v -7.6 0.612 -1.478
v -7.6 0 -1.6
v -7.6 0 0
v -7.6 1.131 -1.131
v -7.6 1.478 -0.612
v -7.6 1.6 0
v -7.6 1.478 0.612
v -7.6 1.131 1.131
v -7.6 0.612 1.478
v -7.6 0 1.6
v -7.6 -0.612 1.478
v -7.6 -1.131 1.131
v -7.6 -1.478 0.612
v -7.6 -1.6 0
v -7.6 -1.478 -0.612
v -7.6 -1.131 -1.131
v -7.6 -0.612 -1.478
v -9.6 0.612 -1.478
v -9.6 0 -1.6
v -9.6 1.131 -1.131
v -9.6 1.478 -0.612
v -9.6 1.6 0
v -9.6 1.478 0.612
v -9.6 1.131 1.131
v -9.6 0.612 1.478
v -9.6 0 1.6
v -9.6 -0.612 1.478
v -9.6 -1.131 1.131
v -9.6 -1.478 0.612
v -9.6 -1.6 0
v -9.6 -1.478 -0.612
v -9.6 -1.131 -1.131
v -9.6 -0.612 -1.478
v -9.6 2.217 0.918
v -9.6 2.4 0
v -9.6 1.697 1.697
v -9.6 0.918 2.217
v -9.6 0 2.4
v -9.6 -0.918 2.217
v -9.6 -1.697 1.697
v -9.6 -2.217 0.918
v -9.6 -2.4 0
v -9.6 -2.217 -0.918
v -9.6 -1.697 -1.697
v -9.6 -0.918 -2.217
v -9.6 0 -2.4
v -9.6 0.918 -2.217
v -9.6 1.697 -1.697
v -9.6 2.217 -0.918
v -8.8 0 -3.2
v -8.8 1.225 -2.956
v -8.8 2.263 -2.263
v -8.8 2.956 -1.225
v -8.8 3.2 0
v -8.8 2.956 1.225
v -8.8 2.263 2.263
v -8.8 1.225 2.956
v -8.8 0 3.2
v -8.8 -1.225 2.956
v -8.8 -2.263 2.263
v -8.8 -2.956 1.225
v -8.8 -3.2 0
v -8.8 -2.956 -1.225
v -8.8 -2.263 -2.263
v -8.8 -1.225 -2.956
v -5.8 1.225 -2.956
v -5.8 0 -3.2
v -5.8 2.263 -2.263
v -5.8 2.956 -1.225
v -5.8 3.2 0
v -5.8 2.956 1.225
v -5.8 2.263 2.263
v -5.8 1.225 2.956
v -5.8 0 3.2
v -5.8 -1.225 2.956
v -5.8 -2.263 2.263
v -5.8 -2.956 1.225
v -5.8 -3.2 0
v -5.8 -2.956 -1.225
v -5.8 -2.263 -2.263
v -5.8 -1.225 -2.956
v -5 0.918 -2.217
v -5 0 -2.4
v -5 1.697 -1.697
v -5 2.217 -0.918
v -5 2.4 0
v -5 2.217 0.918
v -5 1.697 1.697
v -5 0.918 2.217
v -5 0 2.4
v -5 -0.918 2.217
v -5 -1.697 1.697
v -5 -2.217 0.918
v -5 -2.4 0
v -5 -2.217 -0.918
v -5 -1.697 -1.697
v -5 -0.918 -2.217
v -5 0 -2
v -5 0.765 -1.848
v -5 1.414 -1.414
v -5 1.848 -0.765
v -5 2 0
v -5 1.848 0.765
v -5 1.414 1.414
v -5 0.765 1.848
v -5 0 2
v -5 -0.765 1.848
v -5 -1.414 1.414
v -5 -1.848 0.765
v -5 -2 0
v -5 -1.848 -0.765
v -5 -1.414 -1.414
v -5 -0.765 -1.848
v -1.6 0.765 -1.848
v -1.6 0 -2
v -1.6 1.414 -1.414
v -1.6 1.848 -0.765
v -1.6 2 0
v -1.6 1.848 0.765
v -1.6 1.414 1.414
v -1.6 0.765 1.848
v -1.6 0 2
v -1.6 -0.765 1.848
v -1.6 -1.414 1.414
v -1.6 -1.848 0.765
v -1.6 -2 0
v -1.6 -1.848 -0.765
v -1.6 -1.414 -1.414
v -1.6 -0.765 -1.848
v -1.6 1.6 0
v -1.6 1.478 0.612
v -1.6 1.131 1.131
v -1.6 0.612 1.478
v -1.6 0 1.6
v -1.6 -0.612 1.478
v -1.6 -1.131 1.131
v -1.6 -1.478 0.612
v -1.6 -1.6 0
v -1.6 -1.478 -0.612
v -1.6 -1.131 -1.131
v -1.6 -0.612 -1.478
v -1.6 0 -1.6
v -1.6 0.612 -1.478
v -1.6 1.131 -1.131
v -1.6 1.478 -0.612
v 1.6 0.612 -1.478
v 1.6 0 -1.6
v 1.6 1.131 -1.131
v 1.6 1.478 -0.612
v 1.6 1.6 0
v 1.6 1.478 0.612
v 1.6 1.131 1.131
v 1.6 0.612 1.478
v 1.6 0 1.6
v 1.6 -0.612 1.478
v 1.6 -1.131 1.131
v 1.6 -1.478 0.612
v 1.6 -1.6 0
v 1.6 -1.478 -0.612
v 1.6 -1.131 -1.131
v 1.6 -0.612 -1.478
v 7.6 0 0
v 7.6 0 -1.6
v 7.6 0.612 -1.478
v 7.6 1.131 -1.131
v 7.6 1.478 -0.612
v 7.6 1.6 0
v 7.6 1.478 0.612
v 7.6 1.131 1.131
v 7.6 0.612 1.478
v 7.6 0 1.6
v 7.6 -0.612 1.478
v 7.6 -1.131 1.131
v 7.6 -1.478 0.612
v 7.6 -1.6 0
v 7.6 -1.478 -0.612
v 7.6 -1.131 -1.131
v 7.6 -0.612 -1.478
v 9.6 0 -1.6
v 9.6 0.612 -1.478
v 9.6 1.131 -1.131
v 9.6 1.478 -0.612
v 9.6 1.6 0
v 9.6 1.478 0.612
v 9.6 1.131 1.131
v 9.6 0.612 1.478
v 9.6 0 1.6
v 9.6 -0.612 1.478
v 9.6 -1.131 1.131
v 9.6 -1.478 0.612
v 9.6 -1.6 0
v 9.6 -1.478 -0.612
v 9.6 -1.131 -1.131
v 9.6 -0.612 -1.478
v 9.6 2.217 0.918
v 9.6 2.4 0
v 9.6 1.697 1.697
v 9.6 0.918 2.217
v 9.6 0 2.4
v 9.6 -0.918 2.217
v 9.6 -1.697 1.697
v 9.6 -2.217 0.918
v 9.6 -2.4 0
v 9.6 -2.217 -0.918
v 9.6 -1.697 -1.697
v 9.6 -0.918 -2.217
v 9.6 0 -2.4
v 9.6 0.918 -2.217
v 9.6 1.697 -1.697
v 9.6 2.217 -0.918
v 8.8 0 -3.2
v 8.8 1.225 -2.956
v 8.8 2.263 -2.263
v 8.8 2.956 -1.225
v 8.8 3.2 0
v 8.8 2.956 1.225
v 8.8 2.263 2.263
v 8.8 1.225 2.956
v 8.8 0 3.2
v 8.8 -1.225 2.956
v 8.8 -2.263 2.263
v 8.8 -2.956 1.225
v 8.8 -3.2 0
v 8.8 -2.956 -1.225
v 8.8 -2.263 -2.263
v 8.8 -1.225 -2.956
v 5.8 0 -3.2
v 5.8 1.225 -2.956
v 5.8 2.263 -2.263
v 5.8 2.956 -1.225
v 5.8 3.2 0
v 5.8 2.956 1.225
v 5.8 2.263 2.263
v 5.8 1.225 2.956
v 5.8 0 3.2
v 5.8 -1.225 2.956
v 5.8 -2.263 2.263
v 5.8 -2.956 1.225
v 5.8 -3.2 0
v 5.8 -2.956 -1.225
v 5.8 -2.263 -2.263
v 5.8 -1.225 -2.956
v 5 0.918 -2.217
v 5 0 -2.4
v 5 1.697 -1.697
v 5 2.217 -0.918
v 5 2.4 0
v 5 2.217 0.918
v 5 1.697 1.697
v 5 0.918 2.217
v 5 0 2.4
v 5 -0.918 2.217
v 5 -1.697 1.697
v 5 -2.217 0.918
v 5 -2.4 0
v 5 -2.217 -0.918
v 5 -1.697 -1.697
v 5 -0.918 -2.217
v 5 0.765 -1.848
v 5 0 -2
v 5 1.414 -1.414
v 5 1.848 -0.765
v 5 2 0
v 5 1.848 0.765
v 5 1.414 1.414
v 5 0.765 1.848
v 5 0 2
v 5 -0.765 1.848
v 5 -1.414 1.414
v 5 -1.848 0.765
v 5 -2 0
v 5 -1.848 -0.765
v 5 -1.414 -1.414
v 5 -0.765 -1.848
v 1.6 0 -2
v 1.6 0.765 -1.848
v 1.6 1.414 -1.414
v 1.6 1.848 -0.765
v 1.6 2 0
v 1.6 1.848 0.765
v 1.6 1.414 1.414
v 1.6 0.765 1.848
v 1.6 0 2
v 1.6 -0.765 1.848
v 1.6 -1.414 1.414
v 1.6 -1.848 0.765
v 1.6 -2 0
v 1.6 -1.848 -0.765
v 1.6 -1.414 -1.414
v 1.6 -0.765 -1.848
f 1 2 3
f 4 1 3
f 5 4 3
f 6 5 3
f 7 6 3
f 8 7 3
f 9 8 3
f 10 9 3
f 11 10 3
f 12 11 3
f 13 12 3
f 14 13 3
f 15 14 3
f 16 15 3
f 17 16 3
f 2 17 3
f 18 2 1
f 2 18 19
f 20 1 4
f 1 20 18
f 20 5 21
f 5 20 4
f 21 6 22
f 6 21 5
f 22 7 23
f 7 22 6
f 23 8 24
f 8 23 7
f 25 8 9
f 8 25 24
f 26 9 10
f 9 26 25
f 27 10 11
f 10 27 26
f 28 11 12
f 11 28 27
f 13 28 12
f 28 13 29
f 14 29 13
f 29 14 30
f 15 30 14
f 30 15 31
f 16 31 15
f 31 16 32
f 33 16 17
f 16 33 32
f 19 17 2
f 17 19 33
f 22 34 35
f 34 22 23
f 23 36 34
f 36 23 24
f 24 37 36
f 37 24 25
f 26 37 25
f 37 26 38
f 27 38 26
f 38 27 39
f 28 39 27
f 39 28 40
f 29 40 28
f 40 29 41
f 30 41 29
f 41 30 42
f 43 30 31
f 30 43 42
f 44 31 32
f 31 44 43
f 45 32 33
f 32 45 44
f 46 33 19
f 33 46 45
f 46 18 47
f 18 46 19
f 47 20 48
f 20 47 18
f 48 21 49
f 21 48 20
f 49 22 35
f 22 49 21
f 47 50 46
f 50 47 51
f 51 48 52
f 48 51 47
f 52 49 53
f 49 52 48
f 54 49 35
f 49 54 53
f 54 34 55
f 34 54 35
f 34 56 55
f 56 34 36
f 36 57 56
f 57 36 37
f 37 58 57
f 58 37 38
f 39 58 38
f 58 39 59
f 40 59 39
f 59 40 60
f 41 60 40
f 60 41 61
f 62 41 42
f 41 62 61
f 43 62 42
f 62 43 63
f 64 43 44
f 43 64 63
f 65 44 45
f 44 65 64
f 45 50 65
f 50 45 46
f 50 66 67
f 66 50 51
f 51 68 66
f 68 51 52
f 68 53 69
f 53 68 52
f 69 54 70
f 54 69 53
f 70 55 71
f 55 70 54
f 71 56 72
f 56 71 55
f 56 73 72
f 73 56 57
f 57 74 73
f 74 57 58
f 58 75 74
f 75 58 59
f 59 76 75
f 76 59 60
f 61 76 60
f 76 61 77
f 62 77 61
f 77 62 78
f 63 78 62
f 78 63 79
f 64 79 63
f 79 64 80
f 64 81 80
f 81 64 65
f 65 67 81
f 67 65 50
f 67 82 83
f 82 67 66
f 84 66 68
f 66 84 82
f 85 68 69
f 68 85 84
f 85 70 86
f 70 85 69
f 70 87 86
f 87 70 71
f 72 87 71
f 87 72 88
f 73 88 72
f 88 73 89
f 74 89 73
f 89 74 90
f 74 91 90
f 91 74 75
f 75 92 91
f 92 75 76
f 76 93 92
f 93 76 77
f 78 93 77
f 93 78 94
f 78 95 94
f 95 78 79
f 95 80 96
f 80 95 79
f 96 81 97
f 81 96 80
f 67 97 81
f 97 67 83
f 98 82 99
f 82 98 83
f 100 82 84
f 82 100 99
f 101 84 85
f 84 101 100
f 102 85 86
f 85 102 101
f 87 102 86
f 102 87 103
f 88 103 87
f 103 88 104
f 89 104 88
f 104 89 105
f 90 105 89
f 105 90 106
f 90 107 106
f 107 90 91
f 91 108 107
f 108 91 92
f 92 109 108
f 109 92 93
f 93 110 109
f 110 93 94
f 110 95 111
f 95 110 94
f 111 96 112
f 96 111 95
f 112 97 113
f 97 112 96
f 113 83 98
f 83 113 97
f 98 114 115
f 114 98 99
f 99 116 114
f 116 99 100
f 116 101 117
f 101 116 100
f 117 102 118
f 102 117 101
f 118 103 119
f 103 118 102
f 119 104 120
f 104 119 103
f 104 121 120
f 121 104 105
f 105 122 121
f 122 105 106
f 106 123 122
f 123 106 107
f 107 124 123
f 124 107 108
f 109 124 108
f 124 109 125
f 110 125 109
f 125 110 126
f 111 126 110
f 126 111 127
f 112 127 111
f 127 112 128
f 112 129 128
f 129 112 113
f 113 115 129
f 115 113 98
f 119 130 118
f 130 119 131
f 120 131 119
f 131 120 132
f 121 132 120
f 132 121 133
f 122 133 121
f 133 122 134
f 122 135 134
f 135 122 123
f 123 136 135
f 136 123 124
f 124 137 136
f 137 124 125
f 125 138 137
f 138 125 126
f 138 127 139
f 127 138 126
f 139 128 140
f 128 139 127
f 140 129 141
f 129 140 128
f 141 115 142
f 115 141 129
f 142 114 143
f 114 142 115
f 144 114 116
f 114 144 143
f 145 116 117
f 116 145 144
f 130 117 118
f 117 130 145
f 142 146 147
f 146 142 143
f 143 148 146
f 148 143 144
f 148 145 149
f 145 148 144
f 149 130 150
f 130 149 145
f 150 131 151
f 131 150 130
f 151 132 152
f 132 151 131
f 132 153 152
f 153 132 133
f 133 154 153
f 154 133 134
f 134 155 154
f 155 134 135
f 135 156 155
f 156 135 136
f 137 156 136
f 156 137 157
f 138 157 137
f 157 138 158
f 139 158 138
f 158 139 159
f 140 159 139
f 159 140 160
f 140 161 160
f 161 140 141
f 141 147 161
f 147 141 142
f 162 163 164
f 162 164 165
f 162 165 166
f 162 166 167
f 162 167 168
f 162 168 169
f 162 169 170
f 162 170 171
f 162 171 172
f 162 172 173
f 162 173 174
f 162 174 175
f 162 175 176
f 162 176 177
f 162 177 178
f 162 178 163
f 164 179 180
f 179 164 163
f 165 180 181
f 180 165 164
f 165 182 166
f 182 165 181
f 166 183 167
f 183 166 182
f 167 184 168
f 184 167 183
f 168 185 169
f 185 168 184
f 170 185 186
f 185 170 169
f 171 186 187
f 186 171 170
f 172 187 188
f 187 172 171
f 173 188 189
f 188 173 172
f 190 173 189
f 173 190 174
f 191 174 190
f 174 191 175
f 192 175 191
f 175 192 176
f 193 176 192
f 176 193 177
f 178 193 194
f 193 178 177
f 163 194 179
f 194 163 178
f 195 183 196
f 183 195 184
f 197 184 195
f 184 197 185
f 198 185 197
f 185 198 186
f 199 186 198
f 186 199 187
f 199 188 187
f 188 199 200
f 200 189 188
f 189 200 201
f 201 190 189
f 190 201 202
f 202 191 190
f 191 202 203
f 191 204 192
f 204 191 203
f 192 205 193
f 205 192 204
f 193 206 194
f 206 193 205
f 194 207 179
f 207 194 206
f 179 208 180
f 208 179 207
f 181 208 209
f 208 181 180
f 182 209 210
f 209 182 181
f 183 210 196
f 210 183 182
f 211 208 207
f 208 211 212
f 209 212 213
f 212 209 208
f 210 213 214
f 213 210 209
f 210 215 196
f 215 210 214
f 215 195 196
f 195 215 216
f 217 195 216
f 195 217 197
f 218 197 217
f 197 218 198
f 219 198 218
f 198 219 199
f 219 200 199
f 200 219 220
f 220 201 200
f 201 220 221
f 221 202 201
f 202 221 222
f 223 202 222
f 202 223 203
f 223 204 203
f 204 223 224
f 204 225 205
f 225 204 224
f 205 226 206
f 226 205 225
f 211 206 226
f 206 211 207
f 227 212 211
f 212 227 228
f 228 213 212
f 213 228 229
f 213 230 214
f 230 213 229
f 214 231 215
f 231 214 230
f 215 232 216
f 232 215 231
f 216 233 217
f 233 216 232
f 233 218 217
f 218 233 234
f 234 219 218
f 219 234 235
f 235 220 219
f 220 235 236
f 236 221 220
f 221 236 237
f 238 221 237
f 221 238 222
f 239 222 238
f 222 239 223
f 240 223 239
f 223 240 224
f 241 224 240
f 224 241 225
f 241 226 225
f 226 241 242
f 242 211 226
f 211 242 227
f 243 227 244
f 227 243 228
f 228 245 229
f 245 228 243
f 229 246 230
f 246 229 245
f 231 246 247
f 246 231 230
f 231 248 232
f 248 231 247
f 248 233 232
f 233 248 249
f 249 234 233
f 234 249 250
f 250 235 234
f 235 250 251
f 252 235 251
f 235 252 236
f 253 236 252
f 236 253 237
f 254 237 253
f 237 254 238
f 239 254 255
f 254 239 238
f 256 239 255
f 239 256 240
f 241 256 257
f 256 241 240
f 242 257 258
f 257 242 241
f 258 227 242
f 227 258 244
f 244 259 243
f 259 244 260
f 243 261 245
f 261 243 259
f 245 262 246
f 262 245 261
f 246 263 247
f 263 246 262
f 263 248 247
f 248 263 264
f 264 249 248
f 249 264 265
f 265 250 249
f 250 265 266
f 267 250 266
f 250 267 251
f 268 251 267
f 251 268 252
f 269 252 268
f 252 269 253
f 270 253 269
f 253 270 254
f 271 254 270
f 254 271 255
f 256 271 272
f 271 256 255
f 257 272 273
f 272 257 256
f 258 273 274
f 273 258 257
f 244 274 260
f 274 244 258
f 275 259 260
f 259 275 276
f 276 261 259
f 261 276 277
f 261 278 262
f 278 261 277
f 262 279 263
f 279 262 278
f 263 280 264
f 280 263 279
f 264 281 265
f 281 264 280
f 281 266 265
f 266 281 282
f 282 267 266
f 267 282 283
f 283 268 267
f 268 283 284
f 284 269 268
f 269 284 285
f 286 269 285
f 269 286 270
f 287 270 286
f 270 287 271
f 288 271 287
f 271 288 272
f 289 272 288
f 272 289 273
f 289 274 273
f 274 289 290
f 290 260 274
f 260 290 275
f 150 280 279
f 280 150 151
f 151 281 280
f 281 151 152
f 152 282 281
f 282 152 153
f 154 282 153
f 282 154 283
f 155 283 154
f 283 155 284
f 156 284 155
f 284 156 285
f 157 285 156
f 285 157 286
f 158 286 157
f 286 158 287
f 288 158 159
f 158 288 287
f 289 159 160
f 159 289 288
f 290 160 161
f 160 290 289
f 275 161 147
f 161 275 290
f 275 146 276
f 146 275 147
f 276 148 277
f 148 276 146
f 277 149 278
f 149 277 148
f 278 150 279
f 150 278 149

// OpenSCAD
// file: ../p/4-4ring5.scad
use <../lib.scad>
function ldraw_lib__4_4ring5() = [
// 0 Ring  5 x 1.0
// 0 Name: 4-4ring5.dat
// 0 Author: Mark Kennedy [mkennedy]
// 0 !LDRAW_ORG Primitive UPDATE 2012-01
// 0 !LICENSE Licensed under CC BY 2.0 and CC BY 4.0 : see CAreadme.txt
// 
// 0 BFC CERTIFY CCW
  [0,"BFC","CERTIFY"],
  [0,"BFC","CCW"],
// 
// 0 !HISTORY 2001-10-23 [pneaster] resequenced quads, corrected winding.
// 0 !HISTORY 2001-12-29 [pneaster] Added BFC.
// 0 !HISTORY 2002-04-25 [PTadmin] Official Update 2002-02
// 0 !HISTORY 2007-06-24 [PTadmin] Header formatted for Contributor Agreement
// 0 !HISTORY 2008-07-01 [PTadmin] Official Update 2008-01
// 0 !HISTORY 2012-02-16 [Philo] Changed to CCW
// 0 !HISTORY 2012-03-30 [PTadmin] Official Update 2012-01
// 
// 
// 4 16 6 0 0 5.5433 0 2.2961 4.6195 0 1.9135 5 0 0
  [4,16,6,0,0,5.5433,0,2.2961,4.6195,0,1.9135,5,0,0],
// 4 16 5.5433 0 2.2961 4.2426 0 4.2426 3.5355 0 3.5355 4.6195 0 1.9135
  [4,16,5.5433,0,2.2961,4.2426,0,4.2426,3.5355,0,3.5355,4.6195,0,1.9135],
// 4 16 4.2426 0 4.2426 2.2961 0 5.5433 1.9135 0 4.6195 3.5355 0 3.5355
  [4,16,4.2426,0,4.2426,2.2961,0,5.5433,1.9135,0,4.6195,3.5355,0,3.5355],
// 4 16 2.2961 0 5.5433 0 0 6 0 0 5 1.9135 0 4.6195
  [4,16,2.2961,0,5.5433,0,0,6,0,0,5,1.9135,0,4.6195],
// 4 16 0 0 6 -2.2961 0 5.5433 -1.9135 0 4.6195 0 0 5
  [4,16,0,0,6,-2.2961,0,5.5433,-1.9135,0,4.6195,0,0,5],
// 4 16 -2.2961 0 5.5433 -4.2426 0 4.2426 -3.5355 0 3.5355 -1.9135 0 4.6195
  [4,16,-2.2961,0,5.5433,-4.2426,0,4.2426,-3.5355,0,3.5355,-1.9135,0,4.6195],
// 4 16 -4.2426 0 4.2426 -5.5433 0 2.2961 -4.6195 0 1.9135 -3.5355 0 3.5355
  [4,16,-4.2426,0,4.2426,-5.5433,0,2.2961,-4.6195,0,1.9135,-3.5355,0,3.5355],
// 4 16 -5.5433 0 2.2961 -6 0 0 -5 0 0 -4.6195 0 1.9135
  [4,16,-5.5433,0,2.2961,-6,0,0,-5,0,0,-4.6195,0,1.9135],
// 4 16 -6 0 0 -5.5433 0 -2.2961 -4.6195 0 -1.9135 -5 0 0
  [4,16,-6,0,0,-5.5433,0,-2.2961,-4.6195,0,-1.9135,-5,0,0],
// 4 16 -5.5433 0 -2.2961 -4.2426 0 -4.2426 -3.5355 0 -3.5355 -4.6195 0 -1.9135
  [4,16,-5.5433,0,-2.2961,-4.2426,0,-4.2426,-3.5355,0,-3.5355,-4.6195,0,-1.9135],
// 4 16 -4.2426 0 -4.2426 -2.2961 0 -5.5433 -1.9135 0 -4.6195 -3.5355 0 -3.5355
  [4,16,-4.2426,0,-4.2426,-2.2961,0,-5.5433,-1.9135,0,-4.6195,-3.5355,0,-3.5355],
// 4 16 -2.2961 0 -5.5433 0 0 -6 0 0 -5 -1.9135 0 -4.6195
  [4,16,-2.2961,0,-5.5433,0,0,-6,0,0,-5,-1.9135,0,-4.6195],
// 4 16 0 0 -6 2.2961 0 -5.5433 1.9135 0 -4.6195 0 0 -5
  [4,16,0,0,-6,2.2961,0,-5.5433,1.9135,0,-4.6195,0,0,-5],
// 4 16 2.2961 0 -5.5433 4.2426 0 -4.2426 3.5355 0 -3.5355 1.9135 0 -4.6195
  [4,16,2.2961,0,-5.5433,4.2426,0,-4.2426,3.5355,0,-3.5355,1.9135,0,-4.6195],
// 4 16 4.2426 0 -4.2426 5.5433 0 -2.2961 4.6195 0 -1.9135 3.5355 0 -3.5355
  [4,16,4.2426,0,-4.2426,5.5433,0,-2.2961,4.6195,0,-1.9135,3.5355,0,-3.5355],
// 4 16 5.5433 0 -2.2961 6 0 0 5 0 0 4.6195 0 -1.9135
  [4,16,5.5433,0,-2.2961,6,0,0,5,0,0,4.6195,0,-1.9135],
];
makepoly(ldraw_lib__4_4ring5(), line=0.2);
// file: ../p/4-4ring4.scad
use <../lib.scad>
function ldraw_lib__4_4ring4() = [
// 0 Ring  4 x 1.0
// 0 Name: 4-4ring4.dat
// 0 Author: James Jessiman
// 0 !LDRAW_ORG Primitive UPDATE 2009-01
// 0 !LICENSE Licensed under CC BY 2.0 and CC BY 4.0 : see CAreadme.txt
// 
// 0 BFC CERTIFY CCW
  [0,"BFC","CERTIFY"],
  [0,"BFC","CCW"],
// 
// 0 !HISTORY 1998-12-15 [PTadmin] Official Update 1998-10
// 0 !HISTORY 2002-04-08 [BrickCaster] Modified for BFC compliance
// 0 !HISTORY 2002-04-25 [PTadmin] Official Update 2002-02
// 0 !HISTORY 2007-06-24 [PTadmin] Header formatted for Contributor Agreement
// 0 !HISTORY 2008-07-01 [PTadmin] Official Update 2008-01
// 0 !HISTORY 2008-08-26 [cwdee] Switch polygon winding and rename
// 0 !HISTORY 2009-05-02 [PTadmin] Official Update 2009-01
// 
// 
// 4 16 -1.9135 0 4.6195 -1.5308 0 3.6956 0 0 4 0 0 5
  [4,16,-1.9135,0,4.6195,-1.5308,0,3.6956,0,0,4,0,0,5],
// 4 16 -3.5355 0 3.5355 -2.8284 0 2.8284 -1.5308 0 3.6956 -1.9135 0 4.6195
  [4,16,-3.5355,0,3.5355,-2.8284,0,2.8284,-1.5308,0,3.6956,-1.9135,0,4.6195],
// 4 16 -4.6195 0 1.9135 -3.6956 0 1.5308 -2.8284 0 2.8284 -3.5355 0 3.5355
  [4,16,-4.6195,0,1.9135,-3.6956,0,1.5308,-2.8284,0,2.8284,-3.5355,0,3.5355],
// 4 16 -5 0 0 -4 0 0 -3.6956 0 1.5308 -4.6195 0 1.9135
  [4,16,-5,0,0,-4,0,0,-3.6956,0,1.5308,-4.6195,0,1.9135],
// 4 16 -4.6195 0 -1.9135 -3.6956 0 -1.5308 -4 0 0 -5 0 0
  [4,16,-4.6195,0,-1.9135,-3.6956,0,-1.5308,-4,0,0,-5,0,0],
// 4 16 -3.5355 0 -3.5355 -2.8284 0 -2.8284 -3.6956 0 -1.5308 -4.6195 0 -1.9135
  [4,16,-3.5355,0,-3.5355,-2.8284,0,-2.8284,-3.6956,0,-1.5308,-4.6195,0,-1.9135],
// 4 16 -1.9135 0 -4.6195 -1.5308 0 -3.6956 -2.8284 0 -2.8284 -3.5355 0 -3.5355
  [4,16,-1.9135,0,-4.6195,-1.5308,0,-3.6956,-2.8284,0,-2.8284,-3.5355,0,-3.5355],
// 4 16 0 0 -5 0 0 -4 -1.5308 0 -3.6956 -1.9135 0 -4.6195
  [4,16,0,0,-5,0,0,-4,-1.5308,0,-3.6956,-1.9135,0,-4.6195],
// 4 16 1.9135 0 -4.6195 1.5308 0 -3.6956 0 0 -4 0 0 -5
  [4,16,1.9135,0,-4.6195,1.5308,0,-3.6956,0,0,-4,0,0,-5],
// 4 16 3.5355 0 -3.5355 2.8284 0 -2.8284 1.5308 0 -3.6956 1.9135 0 -4.6195
  [4,16,3.5355,0,-3.5355,2.8284,0,-2.8284,1.5308,0,-3.6956,1.9135,0,-4.6195],
// 4 16 4.6195 0 -1.9135 3.6956 0 -1.5308 2.8284 0 -2.8284 3.5355 0 -3.5355
  [4,16,4.6195,0,-1.9135,3.6956,0,-1.5308,2.8284,0,-2.8284,3.5355,0,-3.5355],
// 4 16 5 0 0 4 0 0 3.6956 0 -1.5308 4.6195 0 -1.9135
  [4,16,5,0,0,4,0,0,3.6956,0,-1.5308,4.6195,0,-1.9135],
// 4 16 4.6195 0 1.9135 3.6956 0 1.5308 4 0 0 5 0 0
  [4,16,4.6195,0,1.9135,3.6956,0,1.5308,4,0,0,5,0,0],
// 4 16 3.5355 0 3.5355 2.8284 0 2.8284 3.6956 0 1.5308 4.6195 0 1.9135
  [4,16,3.5355,0,3.5355,2.8284,0,2.8284,3.6956,0,1.5308,4.6195,0,1.9135],
// 4 16 1.9135 0 4.6195 1.5308 0 3.6956 2.8284 0 2.8284 3.5355 0 3.5355
  [4,16,1.9135,0,4.6195,1.5308,0,3.6956,2.8284,0,2.8284,3.5355,0,3.5355],
// 4 16 0 0 5 0 0 4 1.5308 0 3.6956 1.9135 0 4.6195
  [4,16,0,0,5,0,0,4,1.5308,0,3.6956,1.9135,0,4.6195],
// 0
];
makepoly(ldraw_lib__4_4ring4(), line=0.2);
// file: ../p/4-4ring2.scad
use <../lib.scad>
function ldraw_lib__4_4ring2() = [
// 0 Ring  2 x 1.0
// 0 Name: 4-4ring2.dat
// 0 Author: James Jessiman
// 0 !LDRAW_ORG Primitive UPDATE 2009-01
// 0 !LICENSE Licensed under CC BY 2.0 and CC BY 4.0 : see CAreadme.txt
// 
// 0 BFC CERTIFY CCW
  [0,"BFC","CERTIFY"],
  [0,"BFC","CCW"],
// 
// 0 !HISTORY 1998-12-15 [PTadmin] Official Update 1998-10
// 0 !HISTORY 2002-04-05 [hafhead] Added BFC statement
// 0 !HISTORY 2002-04-25 [PTadmin] Official Update 2002-02
// 0 !HISTORY 2007-06-24 [PTadmin] Header formatted for Contributor Agreement
// 0 !HISTORY 2008-07-01 [PTadmin] Official Update 2008-01
// 0 !HISTORY 2008-08-26 [cwdee] Switch polygon winding and rename
// 0 !HISTORY 2009-05-02 [PTadmin] Official Update 2009-01
// 
// 
// 4 16 -1.1481 0 2.7717 -0.7654 0 1.8478 0 0 2 0 0 3
  [4,16,-1.1481,0,2.7717,-0.7654,0,1.8478,0,0,2,0,0,3],
// 4 16 -2.1213 0 2.1213 -1.4142 0 1.4142 -0.7654 0 1.8478 -1.1481 0 2.7717
  [4,16,-2.1213,0,2.1213,-1.4142,0,1.4142,-0.7654,0,1.8478,-1.1481,0,2.7717],
// 4 16 -2.7717 0 1.1481 -1.8478 0 0.7654 -1.4142 0 1.4142 -2.1213 0 2.1213
  [4,16,-2.7717,0,1.1481,-1.8478,0,0.7654,-1.4142,0,1.4142,-2.1213,0,2.1213],
// 4 16 -3 0 0 -2 0 0 -1.8478 0 0.7654 -2.7717 0 1.1481
  [4,16,-3,0,0,-2,0,0,-1.8478,0,0.7654,-2.7717,0,1.1481],
// 4 16 -2.7717 0 -1.1481 -1.8478 0 -0.7654 -2 0 0 -3 0 0
  [4,16,-2.7717,0,-1.1481,-1.8478,0,-0.7654,-2,0,0,-3,0,0],
// 4 16 -2.1213 0 -2.1213 -1.4142 0 -1.4142 -1.8478 0 -0.7654 -2.7717 0 -1.1481
  [4,16,-2.1213,0,-2.1213,-1.4142,0,-1.4142,-1.8478,0,-0.7654,-2.7717,0,-1.1481],
// 4 16 -1.1481 0 -2.7717 -0.7654 0 -1.8478 -1.4142 0 -1.4142 -2.1213 0 -2.1213
  [4,16,-1.1481,0,-2.7717,-0.7654,0,-1.8478,-1.4142,0,-1.4142,-2.1213,0,-2.1213],
// 4 16 0 0 -3 0 0 -2 -0.7654 0 -1.8478 -1.1481 0 -2.7717
  [4,16,0,0,-3,0,0,-2,-0.7654,0,-1.8478,-1.1481,0,-2.7717],
// 4 16 1.1481 0 -2.7717 0.7654 0 -1.8478 0 0 -2 0 0 -3
  [4,16,1.1481,0,-2.7717,0.7654,0,-1.8478,0,0,-2,0,0,-3],
// 4 16 2.1213 0 -2.1213 1.4142 0 -1.4142 0.7654 0 -1.8478 1.1481 0 -2.7717
  [4,16,2.1213,0,-2.1213,1.4142,0,-1.4142,0.7654,0,-1.8478,1.1481,0,-2.7717],
// 4 16 2.7717 0 -1.1481 1.8478 0 -0.7654 1.4142 0 -1.4142 2.1213 0 -2.1213
  [4,16,2.7717,0,-1.1481,1.8478,0,-0.7654,1.4142,0,-1.4142,2.1213,0,-2.1213],
// 4 16 3 0 0 2 0 0 1.8478 0 -0.7654 2.7717 0 -1.1481
  [4,16,3,0,0,2,0,0,1.8478,0,-0.7654,2.7717,0,-1.1481],
// 4 16 2.7717 0 1.1481 1.8478 0 0.7654 2 0 0 3 0 0
  [4,16,2.7717,0,1.1481,1.8478,0,0.7654,2,0,0,3,0,0],
// 4 16 2.1213 0 2.1213 1.4142 0 1.4142 1.8478 0 0.7654 2.7717 0 1.1481
  [4,16,2.1213,0,2.1213,1.4142,0,1.4142,1.8478,0,0.7654,2.7717,0,1.1481],
// 4 16 1.1481 0 2.7717 0.7654 0 1.8478 1.4142 0 1.4142 2.1213 0 2.1213
  [4,16,1.1481,0,2.7717,0.7654,0,1.8478,1.4142,0,1.4142,2.1213,0,2.1213],
// 4 16 0 0 3 0 0 2 0.7654 0 1.8478 1.1481 0 2.7717
  [4,16,0,0,3,0,0,2,0.7654,0,1.8478,1.1481,0,2.7717],
// 0
];
makepoly(ldraw_lib__4_4ring2(), line=0.2);
// file: ../p/4-4edge.scad
use <../lib.scad>
function ldraw_lib__4_4edge() = [
// 0 Circle 1.0
// 0 Name: 4-4edge.dat
// 0 Author: James Jessiman
// 0 !LDRAW_ORG Primitive UPDATE 2017-01
// 0 !LICENSE Licensed under CC BY 2.0 and CC BY 4.0 : see CAreadme.txt
// 
// 0 BFC CERTIFY CCW
  [0,"BFC","CERTIFY"],
  [0,"BFC","CCW"],
// 
// 0 !HISTORY 1998-12-15 [PTadmin] Official Update 1998-10
// 0 !HISTORY 2005-12-28 [PTadmin] Official Update 2005-01
// 0 !HISTORY 2007-06-24 [PTadmin] Header formatted for Contributor Agreement
// 0 !HISTORY 2008-07-01 [PTadmin] Official Update 2008-01
// 0 !HISTORY 2017-01-15 [Steffen] BFCed
// 0 !HISTORY 2017-12-30 [PTadmin] Official Update 2017-01
// 
// 
// 2 24 1 0 0 0.9239 0 0.3827
  [2,24,1,0,0,0.9239,0,0.3827],
// 2 24 0.9239 0 0.3827 0.7071 0 0.7071
  [2,24,0.9239,0,0.3827,0.7071,0,0.7071],
// 2 24 0.7071 0 0.7071 0.3827 0 0.9239
  [2,24,0.7071,0,0.7071,0.3827,0,0.9239],
// 2 24 0.3827 0 0.9239 0 0 1
  [2,24,0.3827,0,0.9239,0,0,1],
// 2 24 0 0 1 -0.3827 0 0.9239
  [2,24,0,0,1,-0.3827,0,0.9239],
// 2 24 -0.3827 0 0.9239 -0.7071 0 0.7071
  [2,24,-0.3827,0,0.9239,-0.7071,0,0.7071],
// 2 24 -0.7071 0 0.7071 -0.9239 0 0.3827
  [2,24,-0.7071,0,0.7071,-0.9239,0,0.3827],
// 2 24 -0.9239 0 0.3827 -1 0 -0
  [2,24,-0.9239,0,0.3827,-1,0,-0],
// 2 24 -1 0 -0 -0.9239 0 -0.3827
  [2,24,-1,0,-0,-0.9239,0,-0.3827],
// 2 24 -0.9239 0 -0.3827 -0.7071 0 -0.7071
  [2,24,-0.9239,0,-0.3827,-0.7071,0,-0.7071],
// 2 24 -0.7071 0 -0.7071 -0.3827 0 -0.9239
  [2,24,-0.7071,0,-0.7071,-0.3827,0,-0.9239],
// 2 24 -0.3827 0 -0.9239 0 0 -1
  [2,24,-0.3827,0,-0.9239,0,0,-1],
// 2 24 0 0 -1 0.3827 0 -0.9239
  [2,24,0,0,-1,0.3827,0,-0.9239],
// 2 24 0.3827 0 -0.9239 0.7071 0 -0.7071
  [2,24,0.3827,0,-0.9239,0.7071,0,-0.7071],
// 2 24 0.7071 0 -0.7071 0.9239 0 -0.3827
  [2,24,0.7071,0,-0.7071,0.9239,0,-0.3827],
// 2 24 0.9239 0 -0.3827 1 0 0
  [2,24,0.9239,0,-0.3827,1,0,0],
];
makepoly(ldraw_lib__4_4edge(), line=0.2);
// file: ../p/4-4disc.scad
use <../lib.scad>
function ldraw_lib__4_4disc() = [
// 0 Disc 1.0
// 0 Name: 4-4disc.dat
// 0 Author: James Jessiman
// 0 !LDRAW_ORG Primitive UPDATE 2002-02
// 0 !LICENSE Licensed under CC BY 2.0 and CC BY 4.0 : see CAreadme.txt
// 
// 0 BFC CERTIFY CCW
  [0,"BFC","CERTIFY"],
  [0,"BFC","CCW"],
// 
// 0 !HISTORY 1998-12-15 [PTadmin] Official Update 1998-10
// 0 !HISTORY 2002-03-23 [sbliss] Added BFC statement
// 0 !HISTORY 2002-04-25 [PTadmin] Official Update 2002-02
// 0 !HISTORY 2007-06-24 [PTadmin] Header formatted for Contributor Agreement
// 0 !HISTORY 2008-07-01 [PTadmin] Official Update 2008-01
// 
// 
// 3 16 0 0 0 1 0 0 0.9239 0 0.3827
  [3,16,0,0,0,1,0,0,0.9239,0,0.3827],
// 3 16 0 0 0 0.9239 0 0.3827 0.7071 0 0.7071
  [3,16,0,0,0,0.9239,0,0.3827,0.7071,0,0.7071],
// 3 16 0 0 0 0.7071 0 0.7071 0.3827 0 0.9239
  [3,16,0,0,0,0.7071,0,0.7071,0.3827,0,0.9239],
// 3 16 0 0 0 0.3827 0 0.9239 0 0 1
  [3,16,0,0,0,0.3827,0,0.9239,0,0,1],
// 3 16 0 0 0 0 0 1 -0.3827 0 0.9239
  [3,16,0,0,0,0,0,1,-0.3827,0,0.9239],
// 3 16 0 0 0 -0.3827 0 0.9239 -0.7071 0 0.7071
  [3,16,0,0,0,-0.3827,0,0.9239,-0.7071,0,0.7071],
// 3 16 0 0 0 -0.7071 0 0.7071 -0.9239 0 0.3827
  [3,16,0,0,0,-0.7071,0,0.7071,-0.9239,0,0.3827],
// 3 16 0 0 0 -0.9239 0 0.3827 -1 0 -0
  [3,16,0,0,0,-0.9239,0,0.3827,-1,0,-0],
// 3 16 0 0 0 -1 0 -0 -0.9239 0 -0.3827
  [3,16,0,0,0,-1,0,-0,-0.9239,0,-0.3827],
// 3 16 0 0 0 -0.9239 0 -0.3827 -0.7071 0 -0.7071
  [3,16,0,0,0,-0.9239,0,-0.3827,-0.7071,0,-0.7071],
// 3 16 0 0 0 -0.7071 0 -0.7071 -0.3827 0 -0.9239
  [3,16,0,0,0,-0.7071,0,-0.7071,-0.3827,0,-0.9239],
// 3 16 0 0 0 -0.3827 0 -0.9239 0 0 -1
  [3,16,0,0,0,-0.3827,0,-0.9239,0,0,-1],
// 3 16 0 0 0 0 0 -1 0.3827 0 -0.9239
  [3,16,0,0,0,0,0,-1,0.3827,0,-0.9239],
// 3 16 0 0 0 0.3827 0 -0.9239 0.7071 0 -0.7071
  [3,16,0,0,0,0.3827,0,-0.9239,0.7071,0,-0.7071],
// 3 16 0 0 0 0.7071 0 -0.7071 0.9239 0 -0.3827
  [3,16,0,0,0,0.7071,0,-0.7071,0.9239,0,-0.3827],
// 3 16 0 0 0 0.9239 0 -0.3827 1 0 0
  [3,16,0,0,0,0.9239,0,-0.3827,1,0,0],
// 0
];
makepoly(ldraw_lib__4_4disc(), line=0.2);
// file: ../p/4-4cyli.scad
use <../lib.scad>
function ldraw_lib__4_4cyli() = [
// 0 Cylinder 1.0
// 0 Name: 4-4cyli.dat
// 0 Author: James Jessiman
// 0 !LDRAW_ORG Primitive UPDATE 2005-01
// 0 !LICENSE Licensed under CC BY 2.0 and CC BY 4.0 : see CAreadme.txt
// 
// 0 BFC CERTIFY CCW
  [0,"BFC","CERTIFY"],
  [0,"BFC","CCW"],
// 
// 0 !HISTORY 1998-12-15 [PTadmin] Official Update 1998-10
// 0 !HISTORY 2002-03-23 [sbliss] Added BFC statement; merged headers from files in distributions LDraw 0.27 and Complete.
// 0 !HISTORY 2002-04-25 [PTadmin] Official Update 2002-02
// 0 !HISTORY 2004-12-14 [guyvivan] BFC CCW
// 0 !HISTORY 2005-12-28 [PTadmin] Official Update 2005-01
// 0 !HISTORY 2007-06-24 [PTadmin] Header formatted for Contributor Agreement
// 0 !HISTORY 2008-07-01 [PTadmin] Official Update 2008-01
// 
// 
// 4 16 1 1 0 0.9239 1 0.3827 0.9239 0 0.3827 1 0 0
  [4,16,1,1,0,0.9239,1,0.3827,0.9239,0,0.3827,1,0,0],
// 5 24 1 0 0 1 1 0 0.9239 0 0.3827 0.9239 0 -0.3827
  [5,24,1,0,0,1,1,0,0.9239,0,0.3827,0.9239,0,-0.3827],
// 4 16 0.9239 1 0.3827 0.7071 1 0.7071 0.7071 0 0.7071 0.9239 0 0.3827
  [4,16,0.9239,1,0.3827,0.7071,1,0.7071,0.7071,0,0.7071,0.9239,0,0.3827],
// 5 24 0.9239 0 0.3827 0.9239 1 0.3827 0.7071 0 0.7071 1 0 0
  [5,24,0.9239,0,0.3827,0.9239,1,0.3827,0.7071,0,0.7071,1,0,0],
// 4 16 0.7071 1 0.7071 0.3827 1 0.9239 0.3827 0 0.9239 0.7071 0 0.7071
  [4,16,0.7071,1,0.7071,0.3827,1,0.9239,0.3827,0,0.9239,0.7071,0,0.7071],
// 5 24 0.7071 0 0.7071 0.7071 1 0.7071 0.3827 0 0.9239 0.9239 0 0.3827
  [5,24,0.7071,0,0.7071,0.7071,1,0.7071,0.3827,0,0.9239,0.9239,0,0.3827],
// 4 16 0.3827 1 0.9239 0 1 1 0 0 1 0.3827 0 0.9239
  [4,16,0.3827,1,0.9239,0,1,1,0,0,1,0.3827,0,0.9239],
// 5 24 0.3827 0 0.9239 0.3827 1 0.9239 0 0 1 0.7071 0 0.7071
  [5,24,0.3827,0,0.9239,0.3827,1,0.9239,0,0,1,0.7071,0,0.7071],
// 4 16 0 1 1 -0.3827 1 0.9239 -0.3827 0 0.9239 0 0 1
  [4,16,0,1,1,-0.3827,1,0.9239,-0.3827,0,0.9239,0,0,1],
// 5 24 0 0 1 0 1 1 -0.3827 0 0.9239 0.3827 0 0.9239
  [5,24,0,0,1,0,1,1,-0.3827,0,0.9239,0.3827,0,0.9239],
// 4 16 -0.3827 1 0.9239 -0.7071 1 0.7071 -0.7071 0 0.7071 -0.3827 0 0.9239
  [4,16,-0.3827,1,0.9239,-0.7071,1,0.7071,-0.7071,0,0.7071,-0.3827,0,0.9239],
// 5 24 -0.3827 0 0.9239 -0.3827 1 0.9239 -0.7071 0 0.7071 0 0 1
  [5,24,-0.3827,0,0.9239,-0.3827,1,0.9239,-0.7071,0,0.7071,0,0,1],
// 4 16 -0.7071 1 0.7071 -0.9239 1 0.3827 -0.9239 0 0.3827 -0.7071 0 0.7071
  [4,16,-0.7071,1,0.7071,-0.9239,1,0.3827,-0.9239,0,0.3827,-0.7071,0,0.7071],
// 5 24 -0.7071 0 0.7071 -0.7071 1 0.7071 -0.9239 0 0.3827 -0.3827 0 0.9239
  [5,24,-0.7071,0,0.7071,-0.7071,1,0.7071,-0.9239,0,0.3827,-0.3827,0,0.9239],
// 4 16 -0.9239 1 0.3827 -1 1 0 -1 0 0 -0.9239 0 0.3827
  [4,16,-0.9239,1,0.3827,-1,1,0,-1,0,0,-0.9239,0,0.3827],
// 5 24 -0.9239 0 0.3827 -0.9239 1 0.3827 -1 0 0 -0.7071 0 0.7071
  [5,24,-0.9239,0,0.3827,-0.9239,1,0.3827,-1,0,0,-0.7071,0,0.7071],
// 4 16 -1 1 0 -0.9239 1 -0.3827 -0.9239 0 -0.3827 -1 0 0
  [4,16,-1,1,0,-0.9239,1,-0.3827,-0.9239,0,-0.3827,-1,0,0],
// 5 24 -1 0 0 -1 1 0 -0.9239 0 -0.3827 -0.9239 0 0.3827
  [5,24,-1,0,0,-1,1,0,-0.9239,0,-0.3827,-0.9239,0,0.3827],
// 4 16 -0.9239 1 -0.3827 -0.7071 1 -0.7071 -0.7071 0 -0.7071 -0.9239 0 -0.3827
  [4,16,-0.9239,1,-0.3827,-0.7071,1,-0.7071,-0.7071,0,-0.7071,-0.9239,0,-0.3827],
// 5 24 -0.9239 0 -0.3827 -0.9239 1 -0.3827 -0.7071 0 -0.7071 -1 0 0
  [5,24,-0.9239,0,-0.3827,-0.9239,1,-0.3827,-0.7071,0,-0.7071,-1,0,0],
// 4 16 -0.7071 1 -0.7071 -0.3827 1 -0.9239 -0.3827 0 -0.9239 -0.7071 0 -0.7071
  [4,16,-0.7071,1,-0.7071,-0.3827,1,-0.9239,-0.3827,0,-0.9239,-0.7071,0,-0.7071],
// 5 24 -0.7071 0 -0.7071 -0.7071 1 -0.7071 -0.3827 0 -0.9239 -0.9239 0 -0.3827
  [5,24,-0.7071,0,-0.7071,-0.7071,1,-0.7071,-0.3827,0,-0.9239,-0.9239,0,-0.3827],
// 4 16 -0.3827 1 -0.9239 0 1 -1 0 0 -1 -0.3827 0 -0.9239
  [4,16,-0.3827,1,-0.9239,0,1,-1,0,0,-1,-0.3827,0,-0.9239],
// 5 24 -0.3827 0 -0.9239 -0.3827 1 -0.9239 0 0 -1 -0.7071 0 -0.7071
  [5,24,-0.3827,0,-0.9239,-0.3827,1,-0.9239,0,0,-1,-0.7071,0,-0.7071],
// 4 16 0 1 -1 0.3827 1 -0.9239 0.3827 0 -0.9239 0 0 -1
  [4,16,0,1,-1,0.3827,1,-0.9239,0.3827,0,-0.9239,0,0,-1],
// 5 24 0 0 -1 0 1 -1 0.3827 0 -0.9239 -0.3827 0 -0.9239
  [5,24,0,0,-1,0,1,-1,0.3827,0,-0.9239,-0.3827,0,-0.9239],
// 4 16 0.3827 1 -0.9239 0.7071 1 -0.7071 0.7071 0 -0.7071 0.3827 0 -0.9239
  [4,16,0.3827,1,-0.9239,0.7071,1,-0.7071,0.7071,0,-0.7071,0.3827,0,-0.9239],
// 5 24 0.3827 0 -0.9239 0.3827 1 -0.9239 0.7071 0 -0.7071 0 0 -1
  [5,24,0.3827,0,-0.9239,0.3827,1,-0.9239,0.7071,0,-0.7071,0,0,-1],
// 4 16 0.7071 1 -0.7071 0.9239 1 -0.3827 0.9239 0 -0.3827 0.7071 0 -0.7071
  [4,16,0.7071,1,-0.7071,0.9239,1,-0.3827,0.9239,0,-0.3827,0.7071,0,-0.7071],
// 5 24 0.7071 0 -0.7071 0.7071 1 -0.7071 0.9239 0 -0.3827 0.3827 0 -0.9239
  [5,24,0.7071,0,-0.7071,0.7071,1,-0.7071,0.9239,0,-0.3827,0.3827,0,-0.9239],
// 4 16 0.9239 1 -0.3827 1 1 0 1 0 0 0.9239 0 -0.3827
  [4,16,0.9239,1,-0.3827,1,1,0,1,0,0,0.9239,0,-0.3827],
// 5 24 0.9239 0 -0.3827 0.9239 1 -0.3827 1 0 0 0.7071 0 -0.7071
  [5,24,0.9239,0,-0.3827,0.9239,1,-0.3827,1,0,0,0.7071,0,-0.7071],
// 0
];
makepoly(ldraw_lib__4_4cyli(), line=0.2);
// file: ../p/4-4con3.scad
use <../lib.scad>
function ldraw_lib__4_4con3() = [
// 0 Cone  3 x 1.0
// 0 Name: 4-4con3.dat
// 0 Author: Niels Karsdorp [nielsk]
// 0 !LDRAW_ORG Primitive UPDATE 2003-02
// 0 !LICENSE Licensed under CC BY 2.0 and CC BY 4.0 : see CAreadme.txt
// 
// 0 BFC CERTIFY CCW
  [0,"BFC","CERTIFY"],
  [0,"BFC","CCW"],
// 
// 0 !HISTORY 2003-08-01 [PTadmin] Official Update 2003-02
// 0 !HISTORY 2007-06-24 [PTadmin] Header formatted for Contributor Agreement
// 0 !HISTORY 2008-07-01 [PTadmin] Official Update 2008-01
// 
// 
// 5 24 3 1 0 4 0 0 2.7717 1 1.1481 2.7717 1 -1.1481
  [5,24,3,1,0,4,0,0,2.7717,1,1.1481,2.7717,1,-1.1481],
// 5 24 2.7717 1 1.1481 3.6956 0 1.5308 2.1213 1 2.1213 3 1 0
  [5,24,2.7717,1,1.1481,3.6956,0,1.5308,2.1213,1,2.1213,3,1,0],
// 5 24 2.1213 1 2.1213 2.8284 0 2.8284 1.1481 1 2.7717 2.7717 1 1.1481
  [5,24,2.1213,1,2.1213,2.8284,0,2.8284,1.1481,1,2.7717,2.7717,1,1.1481],
// 5 24 1.1481 1 2.7717 1.5308 0 3.6956 0 1 3 2.1213 1 2.1213
  [5,24,1.1481,1,2.7717,1.5308,0,3.6956,0,1,3,2.1213,1,2.1213],
// 5 24 0 1 3 0 0 4 -1.1481 1 2.7717 1.1481 1 2.7717
  [5,24,0,1,3,0,0,4,-1.1481,1,2.7717,1.1481,1,2.7717],
// 5 24 -1.1481 1 2.7717 -1.5308 0 3.6956 -2.1213 1 2.1213 0 1 3
  [5,24,-1.1481,1,2.7717,-1.5308,0,3.6956,-2.1213,1,2.1213,0,1,3],
// 5 24 -2.1213 1 2.1213 -2.8284 0 2.8284 -2.7717 1 1.1481 -1.1481 1 2.7717
  [5,24,-2.1213,1,2.1213,-2.8284,0,2.8284,-2.7717,1,1.1481,-1.1481,1,2.7717],
// 5 24 -2.7717 1 1.1481 -3.6956 0 1.5308 -3 1 0 -2.1213 1 2.1213
  [5,24,-2.7717,1,1.1481,-3.6956,0,1.5308,-3,1,0,-2.1213,1,2.1213],
// 5 24 -3 1 0 -4 0 0 -2.7717 1 -1.1481 -2.7717 1 1.1481
  [5,24,-3,1,0,-4,0,0,-2.7717,1,-1.1481,-2.7717,1,1.1481],
// 5 24 -2.7717 1 -1.1481 -3.6956 0 -1.5308 -2.1213 1 -2.1213 -3 1 0
  [5,24,-2.7717,1,-1.1481,-3.6956,0,-1.5308,-2.1213,1,-2.1213,-3,1,0],
// 5 24 -2.1213 1 -2.1213 -2.8284 0 -2.8284 -1.1481 1 -2.7717 -2.7717 1 -1.1481
  [5,24,-2.1213,1,-2.1213,-2.8284,0,-2.8284,-1.1481,1,-2.7717,-2.7717,1,-1.1481],
// 5 24 -1.1481 1 -2.7717 -1.5308 0 -3.6956 0 1 -3 -2.1213 1 -2.1213
  [5,24,-1.1481,1,-2.7717,-1.5308,0,-3.6956,0,1,-3,-2.1213,1,-2.1213],
// 5 24 0 1 -3 0 0 -4 1.1481 1 -2.7717 -1.1481 1 -2.7717
  [5,24,0,1,-3,0,0,-4,1.1481,1,-2.7717,-1.1481,1,-2.7717],
// 5 24 1.1481 1 -2.7717 1.5308 0 -3.6956 2.1213 1 -2.1213 0 1 -3
  [5,24,1.1481,1,-2.7717,1.5308,0,-3.6956,2.1213,1,-2.1213,0,1,-3],
// 5 24 2.1213 1 -2.1213 2.8284 0 -2.8284 2.7717 1 -1.1481 1.1481 1 -2.7717
  [5,24,2.1213,1,-2.1213,2.8284,0,-2.8284,2.7717,1,-1.1481,1.1481,1,-2.7717],
// 5 24 2.7717 1 -1.1481 3.6956 0 -1.5308 3 1 0 2.1213 1 -2.1213
  [5,24,2.7717,1,-1.1481,3.6956,0,-1.5308,3,1,0,2.1213,1,-2.1213],
// 
// 4 16 3 1 0 2.7717 1 1.1481 3.6956 0 1.5308 4 0 0
  [4,16,3,1,0,2.7717,1,1.1481,3.6956,0,1.5308,4,0,0],
// 4 16 2.7717 1 1.1481 2.1213 1 2.1213 2.8284 0 2.8284 3.6956 0 1.5308
  [4,16,2.7717,1,1.1481,2.1213,1,2.1213,2.8284,0,2.8284,3.6956,0,1.5308],
// 4 16 2.1213 1 2.1213 1.1481 1 2.7717 1.5308 0 3.6956 2.8284 0 2.8284
  [4,16,2.1213,1,2.1213,1.1481,1,2.7717,1.5308,0,3.6956,2.8284,0,2.8284],
// 4 16 1.1481 1 2.7717 0 1 3 0 0 4 1.5308 0 3.6956
  [4,16,1.1481,1,2.7717,0,1,3,0,0,4,1.5308,0,3.6956],
// 4 16 0 1 3 -1.1481 1 2.7717 -1.5308 0 3.6956 0 0 4
  [4,16,0,1,3,-1.1481,1,2.7717,-1.5308,0,3.6956,0,0,4],
// 4 16 -1.1481 1 2.7717 -2.1213 1 2.1213 -2.8284 0 2.8284 -1.5308 0 3.6956
  [4,16,-1.1481,1,2.7717,-2.1213,1,2.1213,-2.8284,0,2.8284,-1.5308,0,3.6956],
// 4 16 -2.1213 1 2.1213 -2.7717 1 1.1481 -3.6956 0 1.5308 -2.8284 0 2.8284
  [4,16,-2.1213,1,2.1213,-2.7717,1,1.1481,-3.6956,0,1.5308,-2.8284,0,2.8284],
// 4 16 -2.7717 1 1.1481 -3 1 0 -4 0 0 -3.6956 0 1.5308
  [4,16,-2.7717,1,1.1481,-3,1,0,-4,0,0,-3.6956,0,1.5308],
// 4 16 -3 1 0 -2.7717 1 -1.1481 -3.6956 0 -1.5308 -4 0 0
  [4,16,-3,1,0,-2.7717,1,-1.1481,-3.6956,0,-1.5308,-4,0,0],
// 4 16 -2.7717 1 -1.1481 -2.1213 1 -2.1213 -2.8284 0 -2.8284 -3.6956 0 -1.5308
  [4,16,-2.7717,1,-1.1481,-2.1213,1,-2.1213,-2.8284,0,-2.8284,-3.6956,0,-1.5308],
// 4 16 -2.1213 1 -2.1213 -1.1481 1 -2.7717 -1.5308 0 -3.6956 -2.8284 0 -2.8284
  [4,16,-2.1213,1,-2.1213,-1.1481,1,-2.7717,-1.5308,0,-3.6956,-2.8284,0,-2.8284],
// 4 16 -1.1481 1 -2.7717 0 1 -3 0 0 -4 -1.5308 0 -3.6956
  [4,16,-1.1481,1,-2.7717,0,1,-3,0,0,-4,-1.5308,0,-3.6956],
// 4 16 0 1 -3 1.1481 1 -2.7717 1.5308 0 -3.6956 0 0 -4
  [4,16,0,1,-3,1.1481,1,-2.7717,1.5308,0,-3.6956,0,0,-4],
// 4 16 1.1481 1 -2.7717 2.1213 1 -2.1213 2.8284 0 -2.8284 1.5308 0 -3.6956
  [4,16,1.1481,1,-2.7717,2.1213,1,-2.1213,2.8284,0,-2.8284,1.5308,0,-3.6956],
// 4 16 2.1213 1 -2.1213 2.7717 1 -1.1481 3.6956 0 -1.5308 2.8284 0 -2.8284
  [4,16,2.1213,1,-2.1213,2.7717,1,-1.1481,3.6956,0,-1.5308,2.8284,0,-2.8284],
// 4 16 2.7717 1 -1.1481 3 1 0 4 0 0 3.6956 0 -1.5308
  [4,16,2.7717,1,-1.1481,3,1,0,4,0,0,3.6956,0,-1.5308],
// 
// 0
// 
];
makepoly(ldraw_lib__4_4con3(), line=0.2);
// main file
use <../lib.scad>
use <../p/4-4con3.scad>
use <../p/4-4cyli.scad>
use <../p/4-4disc.scad>
use <../p/4-4edge.scad>
use <../p/4-4ring2.scad>
use <../p/4-4ring4.scad>
use <../p/4-4ring5.scad>
function ldraw_lib__45918() = [
// 0 Wheels Skateboard
// 0 Name: 45918.dat
// 0 Author: Philippe Hurbain [Philo]
// 0 !LDRAW_ORG Part UPDATE 2012-01
// 0 !LICENSE Licensed under CC BY 2.0 and CC BY 4.0 : see CAreadme.txt
// 
// 0 BFC CERTIFY CCW
  [0,"BFC","CERTIFY"],
  [0,"BFC","CCW"],
// 
// 0 !CATEGORY Minifig Accessory
// 
// 0 !HISTORY 2007-08-25 {LEGO Universe Team} Original part shape
// 0 !HISTORY 2007-10-26 [Philo] File preparation for LDraw Parts Tracker
// 0 !HISTORY 2012-03-30 [PTadmin] Official Update 2012-01
// 
// 
// 1 16 -19 0 0 0 1 0 4 0 0 0 0 4 4-4disc.dat
  [1,16,-19,0,0,0,1,0,4,0,0,0,0,4, ldraw_lib__4_4disc()],
// 1 16 -19 0 0 0 1 0 4 0 0 0 0 4 4-4edge.dat
  [1,16,-19,0,0,0,1,0,4,0,0,0,0,4, ldraw_lib__4_4edge()],
// 1 16 -24 0 0 0 1 0 4 0 0 0 0 4 4-4edge.dat
  [1,16,-24,0,0,0,1,0,4,0,0,0,0,4, ldraw_lib__4_4edge()],
// 0 BFC INVERTNEXT
  [0,"BFC","INVERTNEXT"],
// 1 16 -24 0 0 0 5 0 4 0 0 0 0 4 4-4cyli.dat
  [1,16,-24,0,0,0,5,0,4,0,0,0,0,4, ldraw_lib__4_4cyli()],
// 1 16 -24 0 0 0 1 0 2 0 0 0 0 2 4-4ring2.dat
  [1,16,-24,0,0,0,1,0,2,0,0,0,0,2, ldraw_lib__4_4ring2()],
// 1 16 -24 0 0 0 -1 0 6 0 0 0 0 6 4-4edge.dat
  [1,16,-24,0,0,0,-1,0,6,0,0,0,0,6, ldraw_lib__4_4edge()],
// 1 16 -22 0 0 0 -2 0 2 0 0 0 0 2 4-4con3.dat
  [1,16,-22,0,0,0,-2,0,2,0,0,0,0,2, ldraw_lib__4_4con3()],
// 1 16 -14.5 0 0 0 -7.5 0 8 0 0 0 0 8 4-4cyli.dat
  [1,16,-14.5,0,0,0,-7.5,0,8,0,0,0,0,8, ldraw_lib__4_4cyli()],
// 1 16 -14.5 0 0 0 -1 0 8 0 0 0 0 8 4-4edge.dat
  [1,16,-14.5,0,0,0,-1,0,8,0,0,0,0,8, ldraw_lib__4_4edge()],
// 1 16 -22 0 0 0 -1 0 8 0 0 0 0 8 4-4edge.dat
  [1,16,-22,0,0,0,-1,0,8,0,0,0,0,8, ldraw_lib__4_4edge()],
// 1 16 -14.5 0 0 0 2 0 2 0 0 0 0 2 4-4con3.dat
  [1,16,-14.5,0,0,0,2,0,2,0,0,0,0,2, ldraw_lib__4_4con3()],
// 1 16 -12.5 0 0 0 -1 0 6 0 0 0 0 6 4-4edge.dat
  [1,16,-12.5,0,0,0,-1,0,6,0,0,0,0,6, ldraw_lib__4_4edge()],
// 1 16 -12.5 0 0 0 -1 0 1 0 0 0 0 1 4-4ring5.dat
  [1,16,-12.5,0,0,0,-1,0,1,0,0,0,0,1, ldraw_lib__4_4ring5()],
// 1 16 -4 0 0 0 -8.5 0 5 0 0 0 0 5 4-4cyli.dat
  [1,16,-4,0,0,0,-8.5,0,5,0,0,0,0,5, ldraw_lib__4_4cyli()],
// 1 16 -4 0 0 0 -8.5 0 5 0 0 0 0 5 4-4edge.dat
  [1,16,-4,0,0,0,-8.5,0,5,0,0,0,0,5, ldraw_lib__4_4edge()],
// 1 16 -12.5 0 0 0 -8.5 0 5 0 0 0 0 5 4-4edge.dat
  [1,16,-12.5,0,0,0,-8.5,0,5,0,0,0,0,5, ldraw_lib__4_4edge()],
// 1 16 -4 0 0 0 -1 0 1 0 0 0 0 1 4-4ring4.dat
  [1,16,-4,0,0,0,-1,0,1,0,0,0,0,1, ldraw_lib__4_4ring4()],
// 1 16 -4 0 0 0 8 0 4 0 0 0 0 4 4-4cyli.dat
  [1,16,-4,0,0,0,8,0,4,0,0,0,0,4, ldraw_lib__4_4cyli()],
// 1 16 -4 0 0 0 1 0 4 0 0 0 0 4 4-4edge.dat
  [1,16,-4,0,0,0,1,0,4,0,0,0,0,4, ldraw_lib__4_4edge()],
// 1 16 4 0 0 0 1 0 4 0 0 0 0 4 4-4edge.dat
  [1,16,4,0,0,0,1,0,4,0,0,0,0,4, ldraw_lib__4_4edge()],
// 1 16 19 0 0 0 -1 0 4 0 0 0 0 4 4-4disc.dat
  [1,16,19,0,0,0,-1,0,4,0,0,0,0,4, ldraw_lib__4_4disc()],
// 1 16 19 0 0 0 -1 0 4 0 0 0 0 4 4-4edge.dat
  [1,16,19,0,0,0,-1,0,4,0,0,0,0,4, ldraw_lib__4_4edge()],
// 1 16 24 0 0 0 -1 0 4 0 0 0 0 4 4-4edge.dat
  [1,16,24,0,0,0,-1,0,4,0,0,0,0,4, ldraw_lib__4_4edge()],
// 0 BFC INVERTNEXT
  [0,"BFC","INVERTNEXT"],
// 1 16 24 0 0 0 -5 0 4 0 0 0 0 4 4-4cyli.dat
  [1,16,24,0,0,0,-5,0,4,0,0,0,0,4, ldraw_lib__4_4cyli()],
// 1 16 24 0 0 0 -1 0 2 0 0 0 0 2 4-4ring2.dat
  [1,16,24,0,0,0,-1,0,2,0,0,0,0,2, ldraw_lib__4_4ring2()],
// 1 16 24 0 0 0 1 0 6 0 0 0 0 6 4-4edge.dat
  [1,16,24,0,0,0,1,0,6,0,0,0,0,6, ldraw_lib__4_4edge()],
// 1 16 22 0 0 0 2 0 2 0 0 0 0 2 4-4con3.dat
  [1,16,22,0,0,0,2,0,2,0,0,0,0,2, ldraw_lib__4_4con3()],
// 1 16 14.5 0 0 0 7.5 0 8 0 0 0 0 8 4-4cyli.dat
  [1,16,14.5,0,0,0,7.5,0,8,0,0,0,0,8, ldraw_lib__4_4cyli()],
// 1 16 14.5 0 0 0 1 0 8 0 0 0 0 8 4-4edge.dat
  [1,16,14.5,0,0,0,1,0,8,0,0,0,0,8, ldraw_lib__4_4edge()],
// 1 16 22 0 0 0 1 0 8 0 0 0 0 8 4-4edge.dat
  [1,16,22,0,0,0,1,0,8,0,0,0,0,8, ldraw_lib__4_4edge()],
// 1 16 14.5 0 0 0 -2 0 2 0 0 0 0 2 4-4con3.dat
  [1,16,14.5,0,0,0,-2,0,2,0,0,0,0,2, ldraw_lib__4_4con3()],
// 1 16 12.5 0 0 0 1 0 6 0 0 0 0 6 4-4edge.dat
  [1,16,12.5,0,0,0,1,0,6,0,0,0,0,6, ldraw_lib__4_4edge()],
// 1 16 12.5 0 0 0 1 0 1 0 0 0 0 1 4-4ring5.dat
  [1,16,12.5,0,0,0,1,0,1,0,0,0,0,1, ldraw_lib__4_4ring5()],
// 1 16 4 0 0 0 8.5 0 5 0 0 0 0 5 4-4cyli.dat
  [1,16,4,0,0,0,8.5,0,5,0,0,0,0,5, ldraw_lib__4_4cyli()],
// 1 16 4 0 0 0 8.5 0 5 0 0 0 0 5 4-4edge.dat
  [1,16,4,0,0,0,8.5,0,5,0,0,0,0,5, ldraw_lib__4_4edge()],
// 1 16 12.5 0 0 0 8.5 0 5 0 0 0 0 5 4-4edge.dat
  [1,16,12.5,0,0,0,8.5,0,5,0,0,0,0,5, ldraw_lib__4_4edge()],
// 1 16 4 0 0 0 1 0 1 0 0 0 0 1 4-4ring4.dat
  [1,16,4,0,0,0,1,0,1,0,0,0,0,1, ldraw_lib__4_4ring4()],
// 0
];
makepoly(ldraw_lib__45918(), line=0.2);
